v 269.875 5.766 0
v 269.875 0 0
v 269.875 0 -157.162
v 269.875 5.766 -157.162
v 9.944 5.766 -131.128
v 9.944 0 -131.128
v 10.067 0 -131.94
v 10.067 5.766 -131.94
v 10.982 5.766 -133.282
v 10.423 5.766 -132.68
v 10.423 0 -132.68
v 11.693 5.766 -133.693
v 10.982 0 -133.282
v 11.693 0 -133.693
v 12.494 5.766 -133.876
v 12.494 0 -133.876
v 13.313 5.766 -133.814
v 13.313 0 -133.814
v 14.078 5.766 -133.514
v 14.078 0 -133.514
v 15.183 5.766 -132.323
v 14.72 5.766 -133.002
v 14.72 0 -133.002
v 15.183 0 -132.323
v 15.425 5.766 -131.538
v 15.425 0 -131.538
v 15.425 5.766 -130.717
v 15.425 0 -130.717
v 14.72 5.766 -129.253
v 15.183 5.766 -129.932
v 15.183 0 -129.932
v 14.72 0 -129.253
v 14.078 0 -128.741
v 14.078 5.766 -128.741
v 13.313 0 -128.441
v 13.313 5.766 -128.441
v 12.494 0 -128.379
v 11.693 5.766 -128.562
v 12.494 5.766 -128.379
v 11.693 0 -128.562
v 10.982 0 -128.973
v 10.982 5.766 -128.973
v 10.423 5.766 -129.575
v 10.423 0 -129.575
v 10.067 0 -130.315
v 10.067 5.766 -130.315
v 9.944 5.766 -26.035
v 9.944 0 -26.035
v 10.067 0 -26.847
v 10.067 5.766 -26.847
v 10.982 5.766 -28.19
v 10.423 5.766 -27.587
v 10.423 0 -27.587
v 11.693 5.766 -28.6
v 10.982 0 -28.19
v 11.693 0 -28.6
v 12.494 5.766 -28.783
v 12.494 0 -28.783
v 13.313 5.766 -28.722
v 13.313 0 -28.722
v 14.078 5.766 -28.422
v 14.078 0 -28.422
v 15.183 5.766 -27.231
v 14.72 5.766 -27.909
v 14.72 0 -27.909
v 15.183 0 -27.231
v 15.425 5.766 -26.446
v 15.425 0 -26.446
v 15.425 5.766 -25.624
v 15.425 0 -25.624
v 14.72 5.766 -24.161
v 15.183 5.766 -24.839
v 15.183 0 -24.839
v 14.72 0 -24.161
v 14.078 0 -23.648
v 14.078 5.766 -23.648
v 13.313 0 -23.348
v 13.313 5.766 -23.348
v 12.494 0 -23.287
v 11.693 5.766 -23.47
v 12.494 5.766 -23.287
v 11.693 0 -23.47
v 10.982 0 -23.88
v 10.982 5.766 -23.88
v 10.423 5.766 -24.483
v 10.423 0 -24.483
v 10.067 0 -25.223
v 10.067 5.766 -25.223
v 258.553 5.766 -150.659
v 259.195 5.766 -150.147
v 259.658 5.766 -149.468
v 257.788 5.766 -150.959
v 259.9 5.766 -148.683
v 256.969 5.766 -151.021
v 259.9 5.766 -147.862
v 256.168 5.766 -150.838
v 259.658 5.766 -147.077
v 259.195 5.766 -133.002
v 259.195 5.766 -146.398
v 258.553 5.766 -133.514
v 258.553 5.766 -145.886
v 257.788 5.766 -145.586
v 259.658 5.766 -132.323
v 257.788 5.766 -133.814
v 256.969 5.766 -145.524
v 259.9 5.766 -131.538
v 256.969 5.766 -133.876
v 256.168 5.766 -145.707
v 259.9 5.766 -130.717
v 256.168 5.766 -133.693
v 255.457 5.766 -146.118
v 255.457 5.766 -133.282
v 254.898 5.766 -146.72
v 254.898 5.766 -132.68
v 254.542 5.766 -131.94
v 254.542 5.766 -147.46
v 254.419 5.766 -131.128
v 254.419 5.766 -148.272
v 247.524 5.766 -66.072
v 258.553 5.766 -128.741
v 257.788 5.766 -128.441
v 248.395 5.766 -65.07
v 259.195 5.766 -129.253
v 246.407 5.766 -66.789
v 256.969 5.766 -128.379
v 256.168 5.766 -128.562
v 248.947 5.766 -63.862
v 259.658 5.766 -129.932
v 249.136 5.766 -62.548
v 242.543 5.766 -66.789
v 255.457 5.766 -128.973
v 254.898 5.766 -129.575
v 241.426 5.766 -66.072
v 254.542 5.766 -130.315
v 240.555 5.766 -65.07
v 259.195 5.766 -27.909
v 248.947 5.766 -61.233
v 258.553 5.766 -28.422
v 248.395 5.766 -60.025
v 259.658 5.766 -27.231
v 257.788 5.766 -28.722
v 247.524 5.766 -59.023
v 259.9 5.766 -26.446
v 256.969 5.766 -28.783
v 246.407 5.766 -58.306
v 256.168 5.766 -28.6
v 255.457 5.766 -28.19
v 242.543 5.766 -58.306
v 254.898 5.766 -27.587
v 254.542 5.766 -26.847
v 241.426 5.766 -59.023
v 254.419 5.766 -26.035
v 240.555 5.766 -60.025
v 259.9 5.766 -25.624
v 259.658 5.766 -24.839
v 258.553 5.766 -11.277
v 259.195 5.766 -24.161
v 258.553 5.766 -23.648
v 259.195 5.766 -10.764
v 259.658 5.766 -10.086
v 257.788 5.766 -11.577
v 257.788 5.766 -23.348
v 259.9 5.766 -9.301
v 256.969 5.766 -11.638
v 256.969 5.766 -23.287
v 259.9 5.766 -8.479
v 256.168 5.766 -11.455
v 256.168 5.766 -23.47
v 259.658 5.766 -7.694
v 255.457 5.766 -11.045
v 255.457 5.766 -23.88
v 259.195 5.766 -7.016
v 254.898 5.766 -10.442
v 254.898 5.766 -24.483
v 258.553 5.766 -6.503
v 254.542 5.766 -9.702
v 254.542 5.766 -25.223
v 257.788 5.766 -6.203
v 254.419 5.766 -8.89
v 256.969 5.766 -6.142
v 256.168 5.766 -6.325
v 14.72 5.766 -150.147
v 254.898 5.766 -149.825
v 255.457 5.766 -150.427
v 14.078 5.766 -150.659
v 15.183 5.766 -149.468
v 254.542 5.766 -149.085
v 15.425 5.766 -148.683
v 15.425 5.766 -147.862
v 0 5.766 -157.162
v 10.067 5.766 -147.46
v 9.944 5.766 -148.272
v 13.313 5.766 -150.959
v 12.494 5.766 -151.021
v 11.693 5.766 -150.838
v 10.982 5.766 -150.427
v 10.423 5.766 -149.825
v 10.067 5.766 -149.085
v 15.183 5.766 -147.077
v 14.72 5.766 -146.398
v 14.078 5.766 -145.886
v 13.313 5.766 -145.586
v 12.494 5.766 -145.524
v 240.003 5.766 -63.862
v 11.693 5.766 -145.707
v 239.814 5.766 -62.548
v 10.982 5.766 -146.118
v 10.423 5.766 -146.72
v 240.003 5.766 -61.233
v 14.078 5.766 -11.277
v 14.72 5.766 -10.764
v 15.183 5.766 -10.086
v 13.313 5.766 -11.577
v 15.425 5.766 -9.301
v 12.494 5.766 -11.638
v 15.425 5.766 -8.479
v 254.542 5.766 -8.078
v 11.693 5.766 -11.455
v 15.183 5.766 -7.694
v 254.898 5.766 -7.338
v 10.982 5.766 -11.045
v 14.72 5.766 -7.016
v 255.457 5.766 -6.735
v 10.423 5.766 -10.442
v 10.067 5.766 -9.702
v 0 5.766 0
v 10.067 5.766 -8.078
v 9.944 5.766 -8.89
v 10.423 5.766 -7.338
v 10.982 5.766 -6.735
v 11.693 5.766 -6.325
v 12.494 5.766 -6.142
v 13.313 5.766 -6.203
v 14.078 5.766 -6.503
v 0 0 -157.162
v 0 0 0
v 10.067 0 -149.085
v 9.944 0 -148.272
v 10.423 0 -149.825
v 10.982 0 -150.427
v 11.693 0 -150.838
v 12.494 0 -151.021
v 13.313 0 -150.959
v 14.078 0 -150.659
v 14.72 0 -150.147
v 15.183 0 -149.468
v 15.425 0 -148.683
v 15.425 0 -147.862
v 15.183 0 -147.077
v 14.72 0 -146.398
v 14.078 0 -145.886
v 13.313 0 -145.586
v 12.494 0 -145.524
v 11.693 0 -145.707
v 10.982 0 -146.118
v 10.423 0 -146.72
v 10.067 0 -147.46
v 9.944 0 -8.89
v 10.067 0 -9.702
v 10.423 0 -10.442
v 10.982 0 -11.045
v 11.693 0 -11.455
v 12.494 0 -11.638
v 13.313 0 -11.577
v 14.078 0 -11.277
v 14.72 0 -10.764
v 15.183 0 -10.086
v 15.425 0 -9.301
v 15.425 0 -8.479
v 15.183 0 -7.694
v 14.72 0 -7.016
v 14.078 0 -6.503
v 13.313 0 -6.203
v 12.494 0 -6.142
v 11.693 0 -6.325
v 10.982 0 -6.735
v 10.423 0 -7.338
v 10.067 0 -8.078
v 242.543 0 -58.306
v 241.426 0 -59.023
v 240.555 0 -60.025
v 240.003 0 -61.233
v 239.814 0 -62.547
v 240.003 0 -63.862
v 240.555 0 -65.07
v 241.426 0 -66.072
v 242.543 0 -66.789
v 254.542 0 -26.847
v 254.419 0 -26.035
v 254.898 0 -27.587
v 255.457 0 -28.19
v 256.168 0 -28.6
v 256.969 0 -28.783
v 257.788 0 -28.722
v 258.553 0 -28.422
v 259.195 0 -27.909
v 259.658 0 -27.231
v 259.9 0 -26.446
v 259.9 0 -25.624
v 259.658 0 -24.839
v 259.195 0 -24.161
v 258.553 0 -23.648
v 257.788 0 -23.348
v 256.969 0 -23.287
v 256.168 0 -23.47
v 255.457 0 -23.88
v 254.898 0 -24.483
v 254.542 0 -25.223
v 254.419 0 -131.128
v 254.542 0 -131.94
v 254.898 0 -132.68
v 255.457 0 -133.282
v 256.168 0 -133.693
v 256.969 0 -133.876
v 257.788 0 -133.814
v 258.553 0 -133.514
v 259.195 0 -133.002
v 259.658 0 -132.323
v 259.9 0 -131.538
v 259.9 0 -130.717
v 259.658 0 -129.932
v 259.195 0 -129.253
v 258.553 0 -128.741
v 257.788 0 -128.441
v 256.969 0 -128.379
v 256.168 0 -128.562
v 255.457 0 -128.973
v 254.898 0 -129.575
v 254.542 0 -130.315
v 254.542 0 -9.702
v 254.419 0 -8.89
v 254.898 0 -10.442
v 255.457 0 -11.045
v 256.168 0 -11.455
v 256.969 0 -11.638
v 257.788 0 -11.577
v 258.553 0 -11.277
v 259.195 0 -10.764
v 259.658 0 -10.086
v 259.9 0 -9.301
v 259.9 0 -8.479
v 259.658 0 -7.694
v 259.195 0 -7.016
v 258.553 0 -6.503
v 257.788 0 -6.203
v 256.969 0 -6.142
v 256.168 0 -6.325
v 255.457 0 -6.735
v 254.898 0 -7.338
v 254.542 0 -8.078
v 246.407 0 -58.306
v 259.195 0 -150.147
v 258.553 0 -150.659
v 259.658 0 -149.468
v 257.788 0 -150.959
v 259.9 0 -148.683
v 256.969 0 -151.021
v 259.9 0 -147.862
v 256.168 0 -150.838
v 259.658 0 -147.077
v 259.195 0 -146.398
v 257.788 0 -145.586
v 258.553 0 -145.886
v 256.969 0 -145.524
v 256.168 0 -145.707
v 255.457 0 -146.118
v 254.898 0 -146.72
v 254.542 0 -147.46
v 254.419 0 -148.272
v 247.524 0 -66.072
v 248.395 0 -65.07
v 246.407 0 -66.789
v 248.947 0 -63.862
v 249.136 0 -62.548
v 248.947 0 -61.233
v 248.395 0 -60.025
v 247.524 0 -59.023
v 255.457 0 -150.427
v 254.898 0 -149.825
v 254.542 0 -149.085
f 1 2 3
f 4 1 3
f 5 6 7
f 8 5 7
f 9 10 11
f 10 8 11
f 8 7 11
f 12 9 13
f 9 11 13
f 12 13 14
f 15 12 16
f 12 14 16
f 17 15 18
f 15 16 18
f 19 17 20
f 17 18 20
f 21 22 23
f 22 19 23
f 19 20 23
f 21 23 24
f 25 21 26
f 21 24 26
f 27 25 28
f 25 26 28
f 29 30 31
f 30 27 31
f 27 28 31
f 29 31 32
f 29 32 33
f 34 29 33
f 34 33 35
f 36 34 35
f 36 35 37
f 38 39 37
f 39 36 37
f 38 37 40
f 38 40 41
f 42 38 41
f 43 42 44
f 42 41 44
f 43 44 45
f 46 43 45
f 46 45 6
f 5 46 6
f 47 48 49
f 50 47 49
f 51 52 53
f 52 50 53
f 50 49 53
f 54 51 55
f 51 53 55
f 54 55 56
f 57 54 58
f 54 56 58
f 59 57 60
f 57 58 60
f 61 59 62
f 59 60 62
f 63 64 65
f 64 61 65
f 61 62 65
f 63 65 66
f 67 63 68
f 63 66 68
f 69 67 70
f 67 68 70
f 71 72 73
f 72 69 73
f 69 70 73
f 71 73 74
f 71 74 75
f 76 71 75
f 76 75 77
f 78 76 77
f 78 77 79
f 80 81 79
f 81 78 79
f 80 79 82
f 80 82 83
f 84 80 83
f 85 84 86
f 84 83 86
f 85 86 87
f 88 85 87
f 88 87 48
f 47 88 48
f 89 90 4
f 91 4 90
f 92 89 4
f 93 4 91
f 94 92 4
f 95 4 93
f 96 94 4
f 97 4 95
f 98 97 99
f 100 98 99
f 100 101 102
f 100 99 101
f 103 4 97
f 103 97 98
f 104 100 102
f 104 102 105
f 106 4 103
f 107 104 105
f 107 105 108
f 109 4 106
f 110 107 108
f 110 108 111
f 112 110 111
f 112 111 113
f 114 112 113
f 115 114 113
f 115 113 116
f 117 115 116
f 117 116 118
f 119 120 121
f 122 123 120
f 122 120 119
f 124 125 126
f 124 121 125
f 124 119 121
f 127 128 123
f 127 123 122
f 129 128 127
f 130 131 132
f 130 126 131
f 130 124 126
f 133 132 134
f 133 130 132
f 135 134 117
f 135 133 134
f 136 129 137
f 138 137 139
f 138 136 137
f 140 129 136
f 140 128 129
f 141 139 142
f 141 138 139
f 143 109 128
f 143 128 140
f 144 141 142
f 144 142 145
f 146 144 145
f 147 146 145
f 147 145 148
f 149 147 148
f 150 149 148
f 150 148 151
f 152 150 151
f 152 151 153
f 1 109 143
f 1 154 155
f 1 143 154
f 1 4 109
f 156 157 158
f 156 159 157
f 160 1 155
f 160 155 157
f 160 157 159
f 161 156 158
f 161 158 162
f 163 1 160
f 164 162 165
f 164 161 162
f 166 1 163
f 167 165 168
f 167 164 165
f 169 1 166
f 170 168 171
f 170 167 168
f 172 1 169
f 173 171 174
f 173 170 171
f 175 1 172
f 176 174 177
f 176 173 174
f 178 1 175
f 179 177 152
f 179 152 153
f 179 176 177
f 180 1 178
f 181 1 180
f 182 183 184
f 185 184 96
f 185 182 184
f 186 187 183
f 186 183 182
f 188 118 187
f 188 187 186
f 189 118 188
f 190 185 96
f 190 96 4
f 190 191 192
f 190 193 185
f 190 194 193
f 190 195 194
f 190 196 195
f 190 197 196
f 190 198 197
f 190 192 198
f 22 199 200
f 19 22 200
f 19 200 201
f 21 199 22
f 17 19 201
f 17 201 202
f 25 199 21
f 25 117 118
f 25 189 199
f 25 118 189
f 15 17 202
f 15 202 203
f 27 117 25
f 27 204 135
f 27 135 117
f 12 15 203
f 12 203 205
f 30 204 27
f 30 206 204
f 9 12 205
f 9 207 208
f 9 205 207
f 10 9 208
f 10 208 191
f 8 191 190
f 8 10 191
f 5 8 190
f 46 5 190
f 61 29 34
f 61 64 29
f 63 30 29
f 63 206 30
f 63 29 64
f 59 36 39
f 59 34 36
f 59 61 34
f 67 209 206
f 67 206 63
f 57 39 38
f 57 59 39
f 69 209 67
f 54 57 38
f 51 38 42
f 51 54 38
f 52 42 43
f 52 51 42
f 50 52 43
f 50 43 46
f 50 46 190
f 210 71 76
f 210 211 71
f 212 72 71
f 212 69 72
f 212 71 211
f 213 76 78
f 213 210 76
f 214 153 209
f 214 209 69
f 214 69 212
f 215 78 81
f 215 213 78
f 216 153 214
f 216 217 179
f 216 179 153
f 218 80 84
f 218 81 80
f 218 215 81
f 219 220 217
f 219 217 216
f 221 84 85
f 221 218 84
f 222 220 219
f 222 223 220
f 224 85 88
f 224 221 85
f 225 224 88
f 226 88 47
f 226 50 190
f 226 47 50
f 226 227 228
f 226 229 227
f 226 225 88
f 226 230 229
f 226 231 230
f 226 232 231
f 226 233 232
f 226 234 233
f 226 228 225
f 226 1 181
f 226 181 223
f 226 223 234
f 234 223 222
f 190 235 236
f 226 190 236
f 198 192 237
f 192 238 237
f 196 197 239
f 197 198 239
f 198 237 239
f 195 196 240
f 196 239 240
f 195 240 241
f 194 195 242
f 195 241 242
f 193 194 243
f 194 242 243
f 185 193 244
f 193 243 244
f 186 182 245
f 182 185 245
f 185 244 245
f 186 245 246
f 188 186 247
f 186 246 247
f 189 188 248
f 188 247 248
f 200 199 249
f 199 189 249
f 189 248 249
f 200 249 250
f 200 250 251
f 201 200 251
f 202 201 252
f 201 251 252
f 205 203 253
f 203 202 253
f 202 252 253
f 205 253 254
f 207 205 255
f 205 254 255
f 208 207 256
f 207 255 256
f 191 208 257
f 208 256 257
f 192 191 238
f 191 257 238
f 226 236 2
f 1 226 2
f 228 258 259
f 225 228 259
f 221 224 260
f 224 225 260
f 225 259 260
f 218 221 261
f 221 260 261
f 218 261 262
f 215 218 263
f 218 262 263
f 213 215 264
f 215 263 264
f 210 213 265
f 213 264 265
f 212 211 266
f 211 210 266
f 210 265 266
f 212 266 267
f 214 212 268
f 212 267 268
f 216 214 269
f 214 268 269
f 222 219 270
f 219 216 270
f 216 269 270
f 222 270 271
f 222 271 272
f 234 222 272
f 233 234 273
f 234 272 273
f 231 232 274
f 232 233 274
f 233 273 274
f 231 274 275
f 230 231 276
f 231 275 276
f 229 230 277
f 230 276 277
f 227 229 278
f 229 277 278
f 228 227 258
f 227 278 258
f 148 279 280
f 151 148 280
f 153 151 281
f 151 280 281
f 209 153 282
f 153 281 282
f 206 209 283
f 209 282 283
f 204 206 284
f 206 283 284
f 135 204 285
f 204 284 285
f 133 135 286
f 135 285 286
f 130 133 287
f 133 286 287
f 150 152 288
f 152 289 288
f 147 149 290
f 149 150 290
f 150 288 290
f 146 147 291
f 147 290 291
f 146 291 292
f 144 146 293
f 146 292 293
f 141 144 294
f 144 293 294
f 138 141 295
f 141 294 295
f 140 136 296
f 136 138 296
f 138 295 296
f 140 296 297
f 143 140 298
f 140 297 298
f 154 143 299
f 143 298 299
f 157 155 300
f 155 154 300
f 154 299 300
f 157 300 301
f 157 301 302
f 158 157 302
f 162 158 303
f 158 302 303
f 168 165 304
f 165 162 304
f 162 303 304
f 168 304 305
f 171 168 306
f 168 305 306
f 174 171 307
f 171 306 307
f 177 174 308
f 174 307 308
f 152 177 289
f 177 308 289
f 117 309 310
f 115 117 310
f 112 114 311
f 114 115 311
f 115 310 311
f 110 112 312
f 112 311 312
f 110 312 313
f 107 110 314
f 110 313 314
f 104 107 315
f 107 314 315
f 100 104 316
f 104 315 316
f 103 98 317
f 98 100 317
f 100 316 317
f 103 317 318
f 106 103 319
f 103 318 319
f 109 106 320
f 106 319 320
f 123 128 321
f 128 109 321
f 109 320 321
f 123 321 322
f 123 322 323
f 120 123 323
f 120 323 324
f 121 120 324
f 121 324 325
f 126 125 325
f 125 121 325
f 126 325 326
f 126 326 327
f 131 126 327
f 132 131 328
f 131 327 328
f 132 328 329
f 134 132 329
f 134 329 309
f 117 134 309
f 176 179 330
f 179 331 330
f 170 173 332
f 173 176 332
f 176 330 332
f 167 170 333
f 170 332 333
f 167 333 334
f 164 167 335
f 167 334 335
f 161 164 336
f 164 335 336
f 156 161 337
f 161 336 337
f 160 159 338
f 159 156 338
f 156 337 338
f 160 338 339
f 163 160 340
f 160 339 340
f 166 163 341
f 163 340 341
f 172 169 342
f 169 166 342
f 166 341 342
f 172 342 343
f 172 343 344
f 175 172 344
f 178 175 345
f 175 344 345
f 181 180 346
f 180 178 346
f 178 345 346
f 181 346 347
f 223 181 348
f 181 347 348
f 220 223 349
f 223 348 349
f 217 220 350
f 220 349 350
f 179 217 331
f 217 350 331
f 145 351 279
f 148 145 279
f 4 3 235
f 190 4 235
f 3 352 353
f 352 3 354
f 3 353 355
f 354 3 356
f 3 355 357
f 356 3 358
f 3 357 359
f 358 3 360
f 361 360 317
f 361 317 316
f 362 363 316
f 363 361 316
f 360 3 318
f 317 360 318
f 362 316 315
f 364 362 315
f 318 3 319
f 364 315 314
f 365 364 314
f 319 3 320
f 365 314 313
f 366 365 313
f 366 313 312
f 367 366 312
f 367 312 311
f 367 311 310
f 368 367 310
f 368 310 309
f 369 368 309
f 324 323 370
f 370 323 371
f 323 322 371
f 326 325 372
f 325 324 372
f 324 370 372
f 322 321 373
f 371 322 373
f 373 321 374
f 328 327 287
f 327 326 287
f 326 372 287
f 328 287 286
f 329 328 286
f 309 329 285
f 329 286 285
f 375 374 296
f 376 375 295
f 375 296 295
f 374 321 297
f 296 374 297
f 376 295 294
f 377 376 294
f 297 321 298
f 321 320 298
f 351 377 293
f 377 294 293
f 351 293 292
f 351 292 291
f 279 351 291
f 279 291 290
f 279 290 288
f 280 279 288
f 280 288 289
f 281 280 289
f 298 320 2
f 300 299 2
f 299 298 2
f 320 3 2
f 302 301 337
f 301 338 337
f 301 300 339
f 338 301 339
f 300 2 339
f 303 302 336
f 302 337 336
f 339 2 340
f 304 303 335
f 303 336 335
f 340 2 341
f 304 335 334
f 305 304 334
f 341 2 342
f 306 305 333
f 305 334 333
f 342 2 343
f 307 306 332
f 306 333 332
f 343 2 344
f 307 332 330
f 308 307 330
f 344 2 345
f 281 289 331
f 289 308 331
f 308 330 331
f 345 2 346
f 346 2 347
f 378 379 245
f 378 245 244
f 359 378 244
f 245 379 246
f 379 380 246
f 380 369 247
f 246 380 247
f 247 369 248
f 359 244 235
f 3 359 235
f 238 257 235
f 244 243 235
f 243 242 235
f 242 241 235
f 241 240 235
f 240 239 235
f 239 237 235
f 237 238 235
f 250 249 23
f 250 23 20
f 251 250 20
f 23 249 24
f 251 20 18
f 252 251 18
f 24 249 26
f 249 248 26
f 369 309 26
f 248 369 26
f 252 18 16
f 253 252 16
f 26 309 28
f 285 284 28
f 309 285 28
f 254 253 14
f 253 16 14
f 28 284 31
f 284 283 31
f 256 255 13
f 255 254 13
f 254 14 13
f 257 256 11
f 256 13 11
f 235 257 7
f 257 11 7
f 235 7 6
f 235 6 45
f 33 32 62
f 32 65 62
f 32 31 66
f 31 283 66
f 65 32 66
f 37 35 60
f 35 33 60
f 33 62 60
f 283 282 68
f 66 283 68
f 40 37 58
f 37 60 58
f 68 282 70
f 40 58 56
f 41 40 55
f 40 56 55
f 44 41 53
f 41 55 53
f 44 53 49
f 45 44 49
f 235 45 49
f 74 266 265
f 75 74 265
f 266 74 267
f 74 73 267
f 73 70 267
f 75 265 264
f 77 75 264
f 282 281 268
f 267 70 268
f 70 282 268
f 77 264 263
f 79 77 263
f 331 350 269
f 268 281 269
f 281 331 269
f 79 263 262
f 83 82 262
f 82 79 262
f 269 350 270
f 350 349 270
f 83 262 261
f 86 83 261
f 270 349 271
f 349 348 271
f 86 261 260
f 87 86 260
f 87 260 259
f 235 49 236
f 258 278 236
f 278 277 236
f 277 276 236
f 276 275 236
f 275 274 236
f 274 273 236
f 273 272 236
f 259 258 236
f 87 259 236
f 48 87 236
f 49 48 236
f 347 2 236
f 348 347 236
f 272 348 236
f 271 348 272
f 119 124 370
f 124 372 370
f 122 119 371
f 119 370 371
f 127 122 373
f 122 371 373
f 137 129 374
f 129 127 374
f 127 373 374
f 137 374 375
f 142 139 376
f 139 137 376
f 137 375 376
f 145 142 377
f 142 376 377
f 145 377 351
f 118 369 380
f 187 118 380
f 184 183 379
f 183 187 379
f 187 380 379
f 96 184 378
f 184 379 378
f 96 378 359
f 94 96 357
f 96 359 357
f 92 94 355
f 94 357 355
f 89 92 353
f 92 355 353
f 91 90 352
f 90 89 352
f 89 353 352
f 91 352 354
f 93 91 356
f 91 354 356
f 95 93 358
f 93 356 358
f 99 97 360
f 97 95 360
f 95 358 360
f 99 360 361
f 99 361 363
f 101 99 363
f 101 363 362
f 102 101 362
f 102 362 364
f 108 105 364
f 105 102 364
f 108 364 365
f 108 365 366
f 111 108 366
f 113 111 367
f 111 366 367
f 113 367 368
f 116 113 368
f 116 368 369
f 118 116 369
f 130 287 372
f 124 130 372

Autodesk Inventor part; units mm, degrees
ref_plane "YZ Plane" through (0, 0, 0) normal (1, 0, 0) x (0, 1, 0)
ref_plane "XZ Plane" through (0, 0, 0) normal (0, 1, 0) x (-1, 0, 0)
ref_plane "XY Plane" through (0, 0, 0) normal (0, 0, 1) x (1, 0, 0)
sketch "Sketch1" plane through (0, 0, 0) normal (0, 1, 0) x (-1, 0, 0)
  line L0 (0, 0) -> (-269.875, 0)
  line L1 (-269.875, 0) -> (-269.875, -157.1625)
  line L2 (-269.875, -157.1625) -> (0, -157.1625)
  line L3 (0, -157.1625) -> (0, 0)
  circle A0 centre (-257.175, -148.2725) radius 2.7559
  circle A1 centre (-257.175, -8.89) radius 2.7559
  circle A2 centre (-12.7, -8.89) radius 2.7559
  circle A3 centre (-257.175, -131.1275) radius 2.7559
  circle A4 centre (-257.175, -26.035) radius 2.7559
  circle A5 centre (-12.7, -148.2725) radius 2.7559
  circle A6 centre (-12.7, -131.1275) radius 2.7559
  circle A7 centre (-12.7, -26.035) radius 2.7559
  circle A8 centre (-244.475, -62.5475) radius 4.6609
  line L4 (-242.5434, -66.7893) -> (-246.4066, -66.7893)
  line L5 (-254, -66.7893) -> (-254, -58.3057) construction
  line L6 (-246.4066, -58.3057) -> (-242.5434, -58.3057)
  line L7 (-236.5375, -58.3057) -> (-236.5375, -66.7893) construction
  dimension "d0" = 157.1625
  dimension "d1" = 269.875
  dimension "d2" = 12.7
  dimension "d3" = 8.89
  dimension "d6" = 8.89
  dimension "d7" = 12.7
  dimension "d8" = 12.7
  dimension "d9" = 8.89
  dimension "d11" = 5.5118
  dimension "d12" = 5.5118
  dimension "d13" = 5.5118
  dimension "d15" = 17.145
  dimension "d16" = 12.7
  dimension "d17" = 5.5118
  dimension "d18" = 5.5118
  dimension "d19" = 12.7
  dimension "d20" = 17.145
  dimension "d21" = 12.7
  dimension "d22" = 8.89
  dimension "d23" = 5.5118
  dimension "d24" = 17.145
  dimension "d25" = 12.7
  dimension "d26" = 5.5118
  dimension "d27" = 12.7
  dimension "d28" = 17.145
  dimension "d29" = 5.5118
  dimension "d32" = 25.4
  dimension "d33" = 9.3218
  dimension "d34" = 4.2418
  dimension "d35" = 4.2418
  dimension "d36" = 17.4625
  dimension "d37" = 15.875
  dimension "d38" = 94.615
extrude "Extrusion2" add sketch "Sketch1" along normal blind 5.7658 contours L3 L2 L1 L0 | L6 A8 | A8 L4
properties part number "2023 1 17 Computer Box Door" material "Polycarbonate, Clear"
